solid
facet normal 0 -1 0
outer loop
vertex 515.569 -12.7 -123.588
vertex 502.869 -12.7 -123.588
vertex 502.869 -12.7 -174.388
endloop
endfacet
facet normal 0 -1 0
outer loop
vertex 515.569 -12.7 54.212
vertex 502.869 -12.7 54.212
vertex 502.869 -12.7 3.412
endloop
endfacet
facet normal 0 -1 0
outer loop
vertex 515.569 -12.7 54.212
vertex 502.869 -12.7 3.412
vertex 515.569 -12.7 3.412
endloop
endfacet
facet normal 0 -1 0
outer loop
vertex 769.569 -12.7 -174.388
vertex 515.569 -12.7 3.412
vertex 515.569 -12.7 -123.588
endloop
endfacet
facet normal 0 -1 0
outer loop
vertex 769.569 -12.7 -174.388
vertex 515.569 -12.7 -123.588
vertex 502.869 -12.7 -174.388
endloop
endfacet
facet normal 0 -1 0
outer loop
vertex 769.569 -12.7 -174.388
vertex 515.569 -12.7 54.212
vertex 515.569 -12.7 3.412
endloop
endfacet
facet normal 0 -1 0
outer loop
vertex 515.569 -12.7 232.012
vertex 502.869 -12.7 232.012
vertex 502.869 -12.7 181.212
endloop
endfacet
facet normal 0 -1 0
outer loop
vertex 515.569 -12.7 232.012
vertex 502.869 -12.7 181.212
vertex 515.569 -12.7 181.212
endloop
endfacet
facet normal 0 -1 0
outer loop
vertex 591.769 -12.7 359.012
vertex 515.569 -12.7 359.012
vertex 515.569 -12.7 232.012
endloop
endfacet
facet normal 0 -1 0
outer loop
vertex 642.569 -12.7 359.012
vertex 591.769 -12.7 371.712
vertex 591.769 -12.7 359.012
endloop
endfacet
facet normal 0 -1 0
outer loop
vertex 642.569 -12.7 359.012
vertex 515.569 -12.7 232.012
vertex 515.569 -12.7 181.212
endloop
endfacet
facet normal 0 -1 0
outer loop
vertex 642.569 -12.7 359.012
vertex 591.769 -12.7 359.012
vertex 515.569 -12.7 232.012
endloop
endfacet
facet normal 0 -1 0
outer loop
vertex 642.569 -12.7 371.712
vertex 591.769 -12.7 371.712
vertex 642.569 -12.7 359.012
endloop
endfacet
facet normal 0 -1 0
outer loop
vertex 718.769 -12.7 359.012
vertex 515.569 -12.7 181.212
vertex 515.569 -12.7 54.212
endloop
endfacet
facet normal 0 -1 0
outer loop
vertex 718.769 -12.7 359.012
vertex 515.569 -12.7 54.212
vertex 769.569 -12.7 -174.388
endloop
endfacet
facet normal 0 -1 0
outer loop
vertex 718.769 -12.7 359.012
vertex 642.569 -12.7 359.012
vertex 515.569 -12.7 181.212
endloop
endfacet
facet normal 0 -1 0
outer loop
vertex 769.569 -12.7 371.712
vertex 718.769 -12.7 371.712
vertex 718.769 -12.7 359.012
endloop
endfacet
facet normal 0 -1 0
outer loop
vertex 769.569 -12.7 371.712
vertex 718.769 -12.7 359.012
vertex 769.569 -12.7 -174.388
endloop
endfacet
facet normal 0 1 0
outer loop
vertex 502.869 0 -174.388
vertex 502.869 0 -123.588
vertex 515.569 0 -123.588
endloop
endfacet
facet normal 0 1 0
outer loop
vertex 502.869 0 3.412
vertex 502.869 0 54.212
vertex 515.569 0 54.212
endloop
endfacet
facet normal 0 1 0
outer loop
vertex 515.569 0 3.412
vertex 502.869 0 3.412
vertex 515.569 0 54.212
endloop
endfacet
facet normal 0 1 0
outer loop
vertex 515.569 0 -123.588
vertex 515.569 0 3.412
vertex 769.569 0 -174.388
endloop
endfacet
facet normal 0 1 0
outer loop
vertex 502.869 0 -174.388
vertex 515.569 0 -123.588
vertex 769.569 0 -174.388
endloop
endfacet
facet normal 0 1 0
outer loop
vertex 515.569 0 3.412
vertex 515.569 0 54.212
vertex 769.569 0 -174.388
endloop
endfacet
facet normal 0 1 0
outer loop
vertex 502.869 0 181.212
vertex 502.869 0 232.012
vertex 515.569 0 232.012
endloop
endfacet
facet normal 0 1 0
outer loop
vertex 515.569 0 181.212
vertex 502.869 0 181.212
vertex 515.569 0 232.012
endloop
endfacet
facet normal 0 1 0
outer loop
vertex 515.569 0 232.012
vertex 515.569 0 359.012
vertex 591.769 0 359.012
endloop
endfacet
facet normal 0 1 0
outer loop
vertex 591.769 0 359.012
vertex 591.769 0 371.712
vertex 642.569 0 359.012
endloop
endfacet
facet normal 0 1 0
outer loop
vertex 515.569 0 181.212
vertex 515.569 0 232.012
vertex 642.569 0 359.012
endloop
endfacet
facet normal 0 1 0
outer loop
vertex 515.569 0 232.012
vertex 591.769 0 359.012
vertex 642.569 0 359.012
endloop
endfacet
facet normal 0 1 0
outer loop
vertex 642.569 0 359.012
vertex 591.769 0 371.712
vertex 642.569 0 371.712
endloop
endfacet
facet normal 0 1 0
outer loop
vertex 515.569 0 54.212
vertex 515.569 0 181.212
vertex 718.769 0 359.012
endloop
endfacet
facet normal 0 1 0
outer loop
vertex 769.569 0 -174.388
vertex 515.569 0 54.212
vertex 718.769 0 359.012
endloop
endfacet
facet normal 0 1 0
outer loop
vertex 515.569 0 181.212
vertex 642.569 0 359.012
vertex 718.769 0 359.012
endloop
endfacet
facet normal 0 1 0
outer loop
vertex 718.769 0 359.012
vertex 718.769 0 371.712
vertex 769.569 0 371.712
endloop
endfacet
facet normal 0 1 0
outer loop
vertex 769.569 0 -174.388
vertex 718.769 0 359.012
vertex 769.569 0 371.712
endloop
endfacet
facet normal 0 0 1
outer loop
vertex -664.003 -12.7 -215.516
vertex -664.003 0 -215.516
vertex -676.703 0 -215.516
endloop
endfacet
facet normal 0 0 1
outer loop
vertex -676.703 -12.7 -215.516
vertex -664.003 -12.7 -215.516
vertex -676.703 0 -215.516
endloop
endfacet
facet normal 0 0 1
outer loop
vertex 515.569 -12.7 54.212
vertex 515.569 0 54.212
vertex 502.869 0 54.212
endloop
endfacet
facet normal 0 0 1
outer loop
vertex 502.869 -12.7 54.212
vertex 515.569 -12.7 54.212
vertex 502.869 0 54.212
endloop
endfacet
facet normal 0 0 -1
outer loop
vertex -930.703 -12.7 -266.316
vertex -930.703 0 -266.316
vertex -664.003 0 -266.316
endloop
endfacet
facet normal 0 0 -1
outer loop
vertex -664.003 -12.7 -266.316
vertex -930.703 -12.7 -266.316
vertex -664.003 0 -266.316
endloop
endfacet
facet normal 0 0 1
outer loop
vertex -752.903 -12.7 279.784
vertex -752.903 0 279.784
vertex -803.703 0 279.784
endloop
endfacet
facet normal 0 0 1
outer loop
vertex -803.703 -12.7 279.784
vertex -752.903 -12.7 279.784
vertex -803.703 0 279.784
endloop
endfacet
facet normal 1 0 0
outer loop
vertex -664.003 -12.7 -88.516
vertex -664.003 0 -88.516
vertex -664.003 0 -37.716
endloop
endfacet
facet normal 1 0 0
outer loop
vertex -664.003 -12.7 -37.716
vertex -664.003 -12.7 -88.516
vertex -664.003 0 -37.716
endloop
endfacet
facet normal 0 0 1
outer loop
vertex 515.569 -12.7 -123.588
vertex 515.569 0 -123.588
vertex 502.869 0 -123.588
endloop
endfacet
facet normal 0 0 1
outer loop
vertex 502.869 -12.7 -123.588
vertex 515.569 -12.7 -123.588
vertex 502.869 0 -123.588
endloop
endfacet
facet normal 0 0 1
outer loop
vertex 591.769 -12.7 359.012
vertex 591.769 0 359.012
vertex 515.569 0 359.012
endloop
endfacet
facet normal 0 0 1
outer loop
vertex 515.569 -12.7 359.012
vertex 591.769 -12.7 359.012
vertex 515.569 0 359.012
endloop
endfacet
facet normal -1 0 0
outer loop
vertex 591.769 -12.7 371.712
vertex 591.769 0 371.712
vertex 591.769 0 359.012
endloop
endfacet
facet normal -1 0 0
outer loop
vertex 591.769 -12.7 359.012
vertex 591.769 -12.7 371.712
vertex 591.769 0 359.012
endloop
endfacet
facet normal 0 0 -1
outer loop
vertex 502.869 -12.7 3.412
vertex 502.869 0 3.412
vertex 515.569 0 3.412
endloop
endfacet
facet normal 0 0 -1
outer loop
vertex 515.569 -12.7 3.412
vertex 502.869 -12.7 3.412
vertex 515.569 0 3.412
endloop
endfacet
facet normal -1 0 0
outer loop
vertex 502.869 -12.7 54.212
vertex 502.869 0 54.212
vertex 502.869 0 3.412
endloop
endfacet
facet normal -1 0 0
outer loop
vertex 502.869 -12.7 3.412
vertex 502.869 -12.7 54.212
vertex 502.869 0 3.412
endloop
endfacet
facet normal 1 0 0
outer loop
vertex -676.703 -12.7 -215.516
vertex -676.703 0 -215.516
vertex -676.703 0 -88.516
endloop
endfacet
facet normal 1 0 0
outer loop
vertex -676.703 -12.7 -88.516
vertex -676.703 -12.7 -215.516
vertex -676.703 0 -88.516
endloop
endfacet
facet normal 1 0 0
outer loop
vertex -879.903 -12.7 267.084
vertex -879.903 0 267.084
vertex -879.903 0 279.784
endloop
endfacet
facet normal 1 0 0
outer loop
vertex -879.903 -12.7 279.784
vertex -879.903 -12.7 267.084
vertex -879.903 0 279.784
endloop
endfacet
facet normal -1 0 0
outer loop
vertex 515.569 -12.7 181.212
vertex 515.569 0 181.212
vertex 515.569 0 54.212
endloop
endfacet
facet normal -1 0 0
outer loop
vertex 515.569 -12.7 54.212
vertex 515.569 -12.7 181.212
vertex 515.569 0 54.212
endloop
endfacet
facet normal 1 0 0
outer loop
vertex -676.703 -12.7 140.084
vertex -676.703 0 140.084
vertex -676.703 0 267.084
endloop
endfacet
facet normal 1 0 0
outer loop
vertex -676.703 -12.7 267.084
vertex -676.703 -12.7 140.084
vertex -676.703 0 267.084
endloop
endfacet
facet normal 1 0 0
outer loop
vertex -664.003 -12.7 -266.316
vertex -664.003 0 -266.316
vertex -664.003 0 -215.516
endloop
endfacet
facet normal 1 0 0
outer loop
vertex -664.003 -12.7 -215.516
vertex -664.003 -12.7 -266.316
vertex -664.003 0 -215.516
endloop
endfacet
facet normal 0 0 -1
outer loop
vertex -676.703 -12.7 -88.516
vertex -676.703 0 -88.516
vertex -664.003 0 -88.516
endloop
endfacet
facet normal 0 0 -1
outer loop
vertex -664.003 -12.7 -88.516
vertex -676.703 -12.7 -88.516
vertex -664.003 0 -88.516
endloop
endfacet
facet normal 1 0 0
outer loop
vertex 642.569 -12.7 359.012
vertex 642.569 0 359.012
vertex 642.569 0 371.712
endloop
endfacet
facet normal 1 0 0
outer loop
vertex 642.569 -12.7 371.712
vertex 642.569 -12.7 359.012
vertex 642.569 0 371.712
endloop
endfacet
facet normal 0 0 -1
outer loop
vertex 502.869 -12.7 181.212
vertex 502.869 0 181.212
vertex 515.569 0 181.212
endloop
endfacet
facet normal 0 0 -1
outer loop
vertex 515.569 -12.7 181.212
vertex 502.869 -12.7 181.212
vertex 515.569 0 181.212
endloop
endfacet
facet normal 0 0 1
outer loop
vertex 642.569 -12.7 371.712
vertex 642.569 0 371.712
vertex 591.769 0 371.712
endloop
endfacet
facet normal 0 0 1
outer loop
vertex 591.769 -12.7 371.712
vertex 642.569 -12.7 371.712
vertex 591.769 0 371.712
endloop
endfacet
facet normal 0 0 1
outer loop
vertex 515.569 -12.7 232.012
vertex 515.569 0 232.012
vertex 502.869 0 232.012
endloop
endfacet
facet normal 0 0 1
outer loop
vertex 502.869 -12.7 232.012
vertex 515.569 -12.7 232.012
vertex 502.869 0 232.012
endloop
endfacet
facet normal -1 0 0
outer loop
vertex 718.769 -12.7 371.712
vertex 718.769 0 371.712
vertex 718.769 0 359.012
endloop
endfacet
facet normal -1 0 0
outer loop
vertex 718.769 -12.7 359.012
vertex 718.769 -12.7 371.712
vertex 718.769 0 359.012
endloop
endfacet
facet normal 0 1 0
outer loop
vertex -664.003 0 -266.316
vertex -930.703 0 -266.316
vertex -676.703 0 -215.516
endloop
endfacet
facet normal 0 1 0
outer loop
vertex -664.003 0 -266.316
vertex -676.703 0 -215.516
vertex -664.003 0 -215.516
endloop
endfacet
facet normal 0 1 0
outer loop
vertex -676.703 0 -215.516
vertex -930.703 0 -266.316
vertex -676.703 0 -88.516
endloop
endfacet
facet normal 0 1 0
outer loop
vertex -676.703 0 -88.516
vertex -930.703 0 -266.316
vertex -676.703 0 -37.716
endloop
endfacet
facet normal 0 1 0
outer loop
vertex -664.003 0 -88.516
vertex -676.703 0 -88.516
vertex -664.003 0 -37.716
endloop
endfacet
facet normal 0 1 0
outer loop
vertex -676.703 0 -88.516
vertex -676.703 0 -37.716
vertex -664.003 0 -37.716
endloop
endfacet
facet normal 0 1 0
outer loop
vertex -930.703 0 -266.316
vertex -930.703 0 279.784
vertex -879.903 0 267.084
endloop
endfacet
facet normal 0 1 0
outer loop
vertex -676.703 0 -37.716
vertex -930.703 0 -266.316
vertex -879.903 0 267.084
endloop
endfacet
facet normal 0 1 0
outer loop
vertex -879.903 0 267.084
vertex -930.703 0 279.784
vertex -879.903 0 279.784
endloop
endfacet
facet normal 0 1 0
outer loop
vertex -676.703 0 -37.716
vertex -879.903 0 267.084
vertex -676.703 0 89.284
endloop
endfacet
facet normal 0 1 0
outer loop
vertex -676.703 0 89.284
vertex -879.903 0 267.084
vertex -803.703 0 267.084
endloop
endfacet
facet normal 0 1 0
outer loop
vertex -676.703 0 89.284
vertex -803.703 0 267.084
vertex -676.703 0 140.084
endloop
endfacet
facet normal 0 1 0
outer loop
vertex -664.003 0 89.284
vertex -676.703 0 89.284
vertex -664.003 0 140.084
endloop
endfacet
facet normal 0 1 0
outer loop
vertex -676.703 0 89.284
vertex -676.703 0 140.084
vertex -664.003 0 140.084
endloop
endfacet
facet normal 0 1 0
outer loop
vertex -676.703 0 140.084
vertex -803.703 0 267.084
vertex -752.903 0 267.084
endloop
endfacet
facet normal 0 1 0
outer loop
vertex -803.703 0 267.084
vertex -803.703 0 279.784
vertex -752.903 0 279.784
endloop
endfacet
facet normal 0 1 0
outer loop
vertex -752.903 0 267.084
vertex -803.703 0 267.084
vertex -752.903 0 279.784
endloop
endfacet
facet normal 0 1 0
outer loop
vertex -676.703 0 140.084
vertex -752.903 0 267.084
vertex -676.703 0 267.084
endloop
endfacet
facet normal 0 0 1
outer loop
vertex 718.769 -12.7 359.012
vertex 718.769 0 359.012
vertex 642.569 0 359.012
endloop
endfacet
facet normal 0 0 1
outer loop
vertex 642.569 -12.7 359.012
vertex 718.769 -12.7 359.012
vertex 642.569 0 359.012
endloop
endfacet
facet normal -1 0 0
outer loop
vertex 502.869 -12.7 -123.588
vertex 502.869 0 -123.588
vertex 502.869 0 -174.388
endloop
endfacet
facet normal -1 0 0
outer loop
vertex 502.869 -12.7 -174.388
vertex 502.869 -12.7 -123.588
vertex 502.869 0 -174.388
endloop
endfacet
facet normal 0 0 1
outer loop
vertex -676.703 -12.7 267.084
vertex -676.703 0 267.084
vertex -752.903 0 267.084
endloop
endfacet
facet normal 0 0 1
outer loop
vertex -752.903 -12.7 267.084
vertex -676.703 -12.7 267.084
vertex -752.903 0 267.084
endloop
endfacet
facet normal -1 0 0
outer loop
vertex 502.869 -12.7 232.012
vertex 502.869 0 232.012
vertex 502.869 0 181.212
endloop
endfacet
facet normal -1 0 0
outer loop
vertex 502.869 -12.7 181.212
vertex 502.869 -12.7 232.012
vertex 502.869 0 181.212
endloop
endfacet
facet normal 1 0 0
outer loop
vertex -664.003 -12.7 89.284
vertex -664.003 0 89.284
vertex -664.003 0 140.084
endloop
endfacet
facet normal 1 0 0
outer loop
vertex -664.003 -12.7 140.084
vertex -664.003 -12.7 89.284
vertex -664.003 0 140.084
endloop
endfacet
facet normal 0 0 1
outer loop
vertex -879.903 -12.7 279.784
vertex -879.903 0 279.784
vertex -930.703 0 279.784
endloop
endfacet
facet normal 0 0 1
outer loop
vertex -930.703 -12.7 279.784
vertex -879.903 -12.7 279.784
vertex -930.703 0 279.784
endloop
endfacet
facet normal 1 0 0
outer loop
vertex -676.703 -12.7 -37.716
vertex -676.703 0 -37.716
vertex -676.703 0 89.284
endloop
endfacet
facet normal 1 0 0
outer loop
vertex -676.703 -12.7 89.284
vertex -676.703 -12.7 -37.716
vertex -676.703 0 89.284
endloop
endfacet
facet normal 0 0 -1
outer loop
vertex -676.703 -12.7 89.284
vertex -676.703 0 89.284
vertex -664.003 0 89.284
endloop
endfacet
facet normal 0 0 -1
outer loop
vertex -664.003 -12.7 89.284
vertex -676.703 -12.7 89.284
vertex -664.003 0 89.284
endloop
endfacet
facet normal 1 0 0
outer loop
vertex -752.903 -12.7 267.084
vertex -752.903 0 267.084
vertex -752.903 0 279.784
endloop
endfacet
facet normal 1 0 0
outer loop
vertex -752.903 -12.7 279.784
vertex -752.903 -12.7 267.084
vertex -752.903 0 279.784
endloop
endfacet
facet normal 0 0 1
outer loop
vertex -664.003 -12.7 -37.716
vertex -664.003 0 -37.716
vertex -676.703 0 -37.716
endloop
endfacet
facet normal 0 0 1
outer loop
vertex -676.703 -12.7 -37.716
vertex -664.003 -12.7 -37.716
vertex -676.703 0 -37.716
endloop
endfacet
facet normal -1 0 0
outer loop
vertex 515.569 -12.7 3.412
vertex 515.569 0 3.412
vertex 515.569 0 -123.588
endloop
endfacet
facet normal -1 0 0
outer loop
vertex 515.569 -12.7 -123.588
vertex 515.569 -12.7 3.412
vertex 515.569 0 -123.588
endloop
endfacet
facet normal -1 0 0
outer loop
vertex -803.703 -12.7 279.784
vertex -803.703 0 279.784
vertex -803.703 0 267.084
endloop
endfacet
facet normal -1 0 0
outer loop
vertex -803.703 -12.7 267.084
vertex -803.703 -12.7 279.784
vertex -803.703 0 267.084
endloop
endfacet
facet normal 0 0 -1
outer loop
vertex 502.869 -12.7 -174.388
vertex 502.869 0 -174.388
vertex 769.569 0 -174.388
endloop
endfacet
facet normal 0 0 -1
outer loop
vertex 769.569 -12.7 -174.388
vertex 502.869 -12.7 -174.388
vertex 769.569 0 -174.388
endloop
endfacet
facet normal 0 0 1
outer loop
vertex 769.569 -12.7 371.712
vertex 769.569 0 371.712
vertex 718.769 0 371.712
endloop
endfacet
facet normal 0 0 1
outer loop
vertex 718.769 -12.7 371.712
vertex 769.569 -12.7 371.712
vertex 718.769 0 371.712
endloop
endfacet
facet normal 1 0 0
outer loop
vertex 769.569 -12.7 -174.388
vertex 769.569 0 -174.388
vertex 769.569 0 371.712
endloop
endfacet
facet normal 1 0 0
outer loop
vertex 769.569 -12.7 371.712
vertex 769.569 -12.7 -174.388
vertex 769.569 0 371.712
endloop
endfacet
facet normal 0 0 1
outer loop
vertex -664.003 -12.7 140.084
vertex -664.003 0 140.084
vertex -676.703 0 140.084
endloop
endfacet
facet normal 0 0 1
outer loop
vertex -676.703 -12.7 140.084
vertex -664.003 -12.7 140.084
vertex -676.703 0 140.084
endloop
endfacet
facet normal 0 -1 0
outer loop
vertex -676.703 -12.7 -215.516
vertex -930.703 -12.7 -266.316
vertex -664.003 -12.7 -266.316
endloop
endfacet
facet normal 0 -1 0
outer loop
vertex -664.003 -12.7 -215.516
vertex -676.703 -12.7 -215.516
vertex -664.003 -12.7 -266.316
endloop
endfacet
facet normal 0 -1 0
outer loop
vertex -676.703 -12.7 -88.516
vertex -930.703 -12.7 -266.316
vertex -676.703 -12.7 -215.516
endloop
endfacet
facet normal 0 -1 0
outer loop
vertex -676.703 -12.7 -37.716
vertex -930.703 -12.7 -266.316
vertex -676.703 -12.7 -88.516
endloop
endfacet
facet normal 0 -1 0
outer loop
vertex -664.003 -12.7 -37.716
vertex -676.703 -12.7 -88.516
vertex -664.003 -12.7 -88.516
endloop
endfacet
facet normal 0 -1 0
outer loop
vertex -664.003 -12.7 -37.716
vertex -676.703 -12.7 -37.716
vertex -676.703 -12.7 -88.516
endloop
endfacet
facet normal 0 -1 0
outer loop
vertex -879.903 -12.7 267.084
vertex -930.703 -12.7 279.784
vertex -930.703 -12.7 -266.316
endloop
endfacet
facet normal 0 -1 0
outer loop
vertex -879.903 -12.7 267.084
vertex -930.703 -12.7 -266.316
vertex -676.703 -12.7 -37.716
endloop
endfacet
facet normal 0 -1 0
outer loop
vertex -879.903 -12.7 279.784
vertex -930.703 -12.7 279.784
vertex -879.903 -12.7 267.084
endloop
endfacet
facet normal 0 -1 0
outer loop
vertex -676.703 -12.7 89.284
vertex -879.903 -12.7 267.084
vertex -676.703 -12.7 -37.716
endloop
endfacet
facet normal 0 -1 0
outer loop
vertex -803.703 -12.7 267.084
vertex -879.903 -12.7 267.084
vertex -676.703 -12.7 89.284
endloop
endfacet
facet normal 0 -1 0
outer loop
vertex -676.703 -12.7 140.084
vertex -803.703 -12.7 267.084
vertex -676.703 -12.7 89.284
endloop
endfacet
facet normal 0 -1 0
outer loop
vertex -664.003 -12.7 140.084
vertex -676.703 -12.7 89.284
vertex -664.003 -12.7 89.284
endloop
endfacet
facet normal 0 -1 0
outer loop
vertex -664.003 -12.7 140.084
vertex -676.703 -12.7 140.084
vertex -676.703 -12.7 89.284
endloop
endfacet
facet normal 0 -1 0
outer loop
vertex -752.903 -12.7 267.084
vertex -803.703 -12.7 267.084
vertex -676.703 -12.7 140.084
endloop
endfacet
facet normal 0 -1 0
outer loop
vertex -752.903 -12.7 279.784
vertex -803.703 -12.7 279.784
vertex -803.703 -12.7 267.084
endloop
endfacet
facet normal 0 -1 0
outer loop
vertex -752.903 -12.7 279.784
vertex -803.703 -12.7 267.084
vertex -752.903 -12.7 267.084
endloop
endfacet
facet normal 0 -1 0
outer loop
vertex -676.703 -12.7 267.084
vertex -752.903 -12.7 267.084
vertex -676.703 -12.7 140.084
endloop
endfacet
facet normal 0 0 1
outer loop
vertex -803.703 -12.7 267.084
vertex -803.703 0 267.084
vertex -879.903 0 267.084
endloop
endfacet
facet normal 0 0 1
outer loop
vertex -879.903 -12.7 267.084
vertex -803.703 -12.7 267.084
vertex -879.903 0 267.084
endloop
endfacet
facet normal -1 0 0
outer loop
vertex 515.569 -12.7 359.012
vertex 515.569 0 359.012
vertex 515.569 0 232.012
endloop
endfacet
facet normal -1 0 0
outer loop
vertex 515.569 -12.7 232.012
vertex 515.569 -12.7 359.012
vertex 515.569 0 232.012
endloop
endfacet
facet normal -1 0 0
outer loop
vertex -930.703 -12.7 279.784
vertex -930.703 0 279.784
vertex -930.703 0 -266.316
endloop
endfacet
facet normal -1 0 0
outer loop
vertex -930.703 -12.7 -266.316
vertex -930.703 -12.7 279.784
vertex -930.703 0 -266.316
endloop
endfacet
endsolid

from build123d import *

# Parameters (mm, degrees)
F1_DEPTH = 12.7


with BuildPart() as f1:
    # F0 (on Front) → F1 (new body)
    with BuildSketch(Plane.XZ):
        Polygon((-930.703029, 267.083907), (-930.703029, -266.316093), (-676.703029, -266.316093), (-664.003029, -266.316093), (-664.003029, -215.516093), (-676.703029, -215.516093), (-676.703029, -88.516093), (-664.003029, -88.516093), (-664.003029, -37.716093), (-676.703029, -37.716093), (-676.703029, 89.283907), (-664.003029, 89.283907), (-664.003029, 140.083907), (-676.703029, 140.083907), (-676.703029, 267.083907), (-752.903029, 267.083907), (-752.903029, 279.783907), (-803.703029, 279.783907), (-803.703029, 267.083907), (-879.903029, 267.083907), (-879.903029, 279.783907), (-930.703029, 279.783907), align=None)
        Polygon((502.869237, -174.3875), (515.569237, -174.3875), (769.569237, -174.3875), (769.569237, 359.0125), (769.569237, 371.7125), (718.769237, 371.7125), (718.769237, 359.0125), (642.569237, 359.0125), (642.569237, 371.7125), (591.769237, 371.7125), (591.769237, 359.0125), (515.569237, 359.0125), (515.569237, 232.0125), (502.869237, 232.0125), (502.869237, 181.2125), (515.569237, 181.2125), (515.569237, 54.2125), (502.869237, 54.2125), (502.869237, 3.4125), (515.569237, 3.4125), (515.569237, -123.5875), (502.869237, -123.5875), align=None)
    extrude(amount=F1_DEPTH)


solid = f1.part
